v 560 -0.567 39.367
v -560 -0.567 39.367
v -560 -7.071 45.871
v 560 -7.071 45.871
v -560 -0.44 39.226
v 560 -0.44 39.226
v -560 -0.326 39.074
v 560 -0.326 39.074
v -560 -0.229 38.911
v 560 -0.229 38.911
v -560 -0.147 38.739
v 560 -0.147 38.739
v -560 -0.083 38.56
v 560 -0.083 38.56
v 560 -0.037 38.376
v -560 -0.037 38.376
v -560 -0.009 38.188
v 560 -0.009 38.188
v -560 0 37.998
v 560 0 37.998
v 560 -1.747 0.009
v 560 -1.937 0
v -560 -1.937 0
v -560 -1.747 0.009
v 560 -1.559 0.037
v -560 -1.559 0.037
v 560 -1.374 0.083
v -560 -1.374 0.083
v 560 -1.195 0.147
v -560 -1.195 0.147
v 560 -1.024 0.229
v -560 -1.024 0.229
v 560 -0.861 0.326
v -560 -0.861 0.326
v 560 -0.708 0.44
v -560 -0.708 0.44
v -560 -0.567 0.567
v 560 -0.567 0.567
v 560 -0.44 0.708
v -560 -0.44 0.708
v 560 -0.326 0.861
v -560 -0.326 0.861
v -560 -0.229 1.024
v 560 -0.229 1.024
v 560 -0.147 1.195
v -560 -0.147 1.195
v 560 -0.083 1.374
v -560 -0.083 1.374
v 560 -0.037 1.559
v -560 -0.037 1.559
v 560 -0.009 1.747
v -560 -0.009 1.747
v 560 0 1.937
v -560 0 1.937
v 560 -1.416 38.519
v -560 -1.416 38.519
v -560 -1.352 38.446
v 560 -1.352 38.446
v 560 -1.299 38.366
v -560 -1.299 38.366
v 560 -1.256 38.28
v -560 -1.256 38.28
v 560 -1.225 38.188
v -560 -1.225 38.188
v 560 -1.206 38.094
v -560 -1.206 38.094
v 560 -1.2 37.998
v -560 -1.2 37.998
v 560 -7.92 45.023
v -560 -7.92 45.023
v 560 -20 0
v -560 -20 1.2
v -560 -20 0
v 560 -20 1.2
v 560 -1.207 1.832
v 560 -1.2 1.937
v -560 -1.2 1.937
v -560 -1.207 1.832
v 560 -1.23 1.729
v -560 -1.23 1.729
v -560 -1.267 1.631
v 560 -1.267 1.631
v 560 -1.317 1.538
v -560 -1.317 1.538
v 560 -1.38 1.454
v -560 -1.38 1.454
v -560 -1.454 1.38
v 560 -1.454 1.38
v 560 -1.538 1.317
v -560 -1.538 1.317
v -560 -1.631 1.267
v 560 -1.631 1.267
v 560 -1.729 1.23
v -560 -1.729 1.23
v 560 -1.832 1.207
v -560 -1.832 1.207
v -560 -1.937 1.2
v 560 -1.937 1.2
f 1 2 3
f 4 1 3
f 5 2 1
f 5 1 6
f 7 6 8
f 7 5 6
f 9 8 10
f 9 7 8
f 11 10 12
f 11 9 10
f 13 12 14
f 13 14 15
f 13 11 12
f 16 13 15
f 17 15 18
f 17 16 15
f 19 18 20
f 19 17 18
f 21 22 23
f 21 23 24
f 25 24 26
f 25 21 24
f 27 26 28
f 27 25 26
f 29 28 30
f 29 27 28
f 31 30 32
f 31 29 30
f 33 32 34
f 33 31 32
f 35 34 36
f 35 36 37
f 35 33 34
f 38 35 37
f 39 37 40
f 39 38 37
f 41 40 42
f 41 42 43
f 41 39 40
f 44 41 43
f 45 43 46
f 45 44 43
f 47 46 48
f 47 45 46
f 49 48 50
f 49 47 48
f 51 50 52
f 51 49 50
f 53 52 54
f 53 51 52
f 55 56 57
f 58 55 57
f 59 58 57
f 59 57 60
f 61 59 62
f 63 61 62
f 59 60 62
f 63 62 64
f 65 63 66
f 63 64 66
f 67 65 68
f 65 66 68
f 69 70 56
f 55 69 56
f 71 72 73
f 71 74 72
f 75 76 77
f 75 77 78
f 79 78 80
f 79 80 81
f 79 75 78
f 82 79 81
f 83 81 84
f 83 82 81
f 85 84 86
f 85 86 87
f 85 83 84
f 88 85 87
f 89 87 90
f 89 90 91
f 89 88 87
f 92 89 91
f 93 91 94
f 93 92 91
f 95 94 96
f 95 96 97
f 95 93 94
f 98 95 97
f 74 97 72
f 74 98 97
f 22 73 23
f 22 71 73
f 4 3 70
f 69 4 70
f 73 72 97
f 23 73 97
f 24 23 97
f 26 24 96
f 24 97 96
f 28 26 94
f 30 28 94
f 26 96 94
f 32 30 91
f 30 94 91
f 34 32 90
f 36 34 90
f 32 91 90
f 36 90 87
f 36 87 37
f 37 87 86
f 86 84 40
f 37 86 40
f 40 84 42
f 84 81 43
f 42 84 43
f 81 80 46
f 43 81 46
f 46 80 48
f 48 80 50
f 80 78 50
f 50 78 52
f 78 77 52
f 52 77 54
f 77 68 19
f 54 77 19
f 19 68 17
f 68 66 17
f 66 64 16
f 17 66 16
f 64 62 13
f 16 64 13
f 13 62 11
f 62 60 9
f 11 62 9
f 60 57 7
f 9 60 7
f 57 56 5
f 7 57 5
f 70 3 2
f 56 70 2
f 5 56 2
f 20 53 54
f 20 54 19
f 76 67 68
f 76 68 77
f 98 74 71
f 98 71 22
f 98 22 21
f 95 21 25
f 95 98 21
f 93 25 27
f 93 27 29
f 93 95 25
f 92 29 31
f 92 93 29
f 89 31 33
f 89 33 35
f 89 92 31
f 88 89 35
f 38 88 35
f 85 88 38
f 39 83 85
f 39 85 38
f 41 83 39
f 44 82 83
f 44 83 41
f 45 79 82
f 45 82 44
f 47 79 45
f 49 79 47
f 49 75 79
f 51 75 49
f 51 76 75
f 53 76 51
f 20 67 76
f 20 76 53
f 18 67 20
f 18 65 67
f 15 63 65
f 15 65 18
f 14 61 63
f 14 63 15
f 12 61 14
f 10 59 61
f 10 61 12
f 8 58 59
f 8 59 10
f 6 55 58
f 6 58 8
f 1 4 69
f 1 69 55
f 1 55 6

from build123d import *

# Parameters (mm, degrees)
BASE_FLANGE1_DEPTH   = 560
EDGE_FLANGE1_START   = -560
EDGE_FLANGE1_DEPTH   = 1120
EDGE_FLANGE1_2_DEPTH = 1120


# Read off the part's stored shape, not the designer's step: Edge-Flange1
# Sheet-metal steps are written as plain solids
with BuildPart() as part:
    # Sketch1 → Base-Flange1 (new, symmetric)
    with BuildSketch(Plane(origin=(0, 0, 0), x_dir=(0, 0, -1), z_dir=(1, 0, 0))):
        with BuildLine():
            Line((0, -20), (0, -1.9366))
            ThreePointArc((0, -1.9366), (-0.567217008, -0.567217008), (-1.9366, 0))
            Line((-1.9366, 0), (-40, 0))
            Line((-40, 0), (-40, -1.2))
            Line((-40, -1.2), (-1.9366, -1.2))
            ThreePointArc((-1.9366, -1.2), (-1.415745145, -1.415745145), (-1.2, -1.9366))
            Line((-1.2, -1.9366), (-1.2, -20))
            Line((-1.2, -20), (0, -20))
        make_face()
    extrude(amount=BASE_FLANGE1_DEPTH, both=True)

    # Edge-Flange1 outline → Edge-Flange1 (cut)
    with BuildSketch(Plane.YZ.offset(EDGE_FLANGE1_START)):
        with BuildLine():
            Line((-1.2, 40), (-0.567217008, 39.367217008))
            ThreePointArc((-0.567217008, 39.367217008), (-0.147414897, 38.738938751), (0, 37.997834015))
            Line((0, 37.997834015), (0, 40))
            Line((0, 40), (-1.2, 40))
        make_face()
    extrude(amount=EDGE_FLANGE1_DEPTH, mode=Mode.SUBTRACT)

    # Edge-Flange1 2 outline → Edge-Flange1 2 (add)
    with BuildSketch(Plane.YZ.offset(EDGE_FLANGE1_START)):
        with BuildLine():
            Line((-1.2, 37.997834015), (-1.2, 40))
            Line((-1.2, 40), (-7.071067812, 45.871067812))
            Line((-7.071067812, 45.871067812), (-7.919595949, 45.022539674))
            Line((-7.919595949, 45.022539674), (-1.415745145, 38.51868887))
            ThreePointArc((-1.415745145, 38.51868887), (-1.256070336, 38.279718631), (-1.2, 37.997834015))
        make_face()
    extrude(amount=EDGE_FLANGE1_2_DEPTH)


solid = part.part
